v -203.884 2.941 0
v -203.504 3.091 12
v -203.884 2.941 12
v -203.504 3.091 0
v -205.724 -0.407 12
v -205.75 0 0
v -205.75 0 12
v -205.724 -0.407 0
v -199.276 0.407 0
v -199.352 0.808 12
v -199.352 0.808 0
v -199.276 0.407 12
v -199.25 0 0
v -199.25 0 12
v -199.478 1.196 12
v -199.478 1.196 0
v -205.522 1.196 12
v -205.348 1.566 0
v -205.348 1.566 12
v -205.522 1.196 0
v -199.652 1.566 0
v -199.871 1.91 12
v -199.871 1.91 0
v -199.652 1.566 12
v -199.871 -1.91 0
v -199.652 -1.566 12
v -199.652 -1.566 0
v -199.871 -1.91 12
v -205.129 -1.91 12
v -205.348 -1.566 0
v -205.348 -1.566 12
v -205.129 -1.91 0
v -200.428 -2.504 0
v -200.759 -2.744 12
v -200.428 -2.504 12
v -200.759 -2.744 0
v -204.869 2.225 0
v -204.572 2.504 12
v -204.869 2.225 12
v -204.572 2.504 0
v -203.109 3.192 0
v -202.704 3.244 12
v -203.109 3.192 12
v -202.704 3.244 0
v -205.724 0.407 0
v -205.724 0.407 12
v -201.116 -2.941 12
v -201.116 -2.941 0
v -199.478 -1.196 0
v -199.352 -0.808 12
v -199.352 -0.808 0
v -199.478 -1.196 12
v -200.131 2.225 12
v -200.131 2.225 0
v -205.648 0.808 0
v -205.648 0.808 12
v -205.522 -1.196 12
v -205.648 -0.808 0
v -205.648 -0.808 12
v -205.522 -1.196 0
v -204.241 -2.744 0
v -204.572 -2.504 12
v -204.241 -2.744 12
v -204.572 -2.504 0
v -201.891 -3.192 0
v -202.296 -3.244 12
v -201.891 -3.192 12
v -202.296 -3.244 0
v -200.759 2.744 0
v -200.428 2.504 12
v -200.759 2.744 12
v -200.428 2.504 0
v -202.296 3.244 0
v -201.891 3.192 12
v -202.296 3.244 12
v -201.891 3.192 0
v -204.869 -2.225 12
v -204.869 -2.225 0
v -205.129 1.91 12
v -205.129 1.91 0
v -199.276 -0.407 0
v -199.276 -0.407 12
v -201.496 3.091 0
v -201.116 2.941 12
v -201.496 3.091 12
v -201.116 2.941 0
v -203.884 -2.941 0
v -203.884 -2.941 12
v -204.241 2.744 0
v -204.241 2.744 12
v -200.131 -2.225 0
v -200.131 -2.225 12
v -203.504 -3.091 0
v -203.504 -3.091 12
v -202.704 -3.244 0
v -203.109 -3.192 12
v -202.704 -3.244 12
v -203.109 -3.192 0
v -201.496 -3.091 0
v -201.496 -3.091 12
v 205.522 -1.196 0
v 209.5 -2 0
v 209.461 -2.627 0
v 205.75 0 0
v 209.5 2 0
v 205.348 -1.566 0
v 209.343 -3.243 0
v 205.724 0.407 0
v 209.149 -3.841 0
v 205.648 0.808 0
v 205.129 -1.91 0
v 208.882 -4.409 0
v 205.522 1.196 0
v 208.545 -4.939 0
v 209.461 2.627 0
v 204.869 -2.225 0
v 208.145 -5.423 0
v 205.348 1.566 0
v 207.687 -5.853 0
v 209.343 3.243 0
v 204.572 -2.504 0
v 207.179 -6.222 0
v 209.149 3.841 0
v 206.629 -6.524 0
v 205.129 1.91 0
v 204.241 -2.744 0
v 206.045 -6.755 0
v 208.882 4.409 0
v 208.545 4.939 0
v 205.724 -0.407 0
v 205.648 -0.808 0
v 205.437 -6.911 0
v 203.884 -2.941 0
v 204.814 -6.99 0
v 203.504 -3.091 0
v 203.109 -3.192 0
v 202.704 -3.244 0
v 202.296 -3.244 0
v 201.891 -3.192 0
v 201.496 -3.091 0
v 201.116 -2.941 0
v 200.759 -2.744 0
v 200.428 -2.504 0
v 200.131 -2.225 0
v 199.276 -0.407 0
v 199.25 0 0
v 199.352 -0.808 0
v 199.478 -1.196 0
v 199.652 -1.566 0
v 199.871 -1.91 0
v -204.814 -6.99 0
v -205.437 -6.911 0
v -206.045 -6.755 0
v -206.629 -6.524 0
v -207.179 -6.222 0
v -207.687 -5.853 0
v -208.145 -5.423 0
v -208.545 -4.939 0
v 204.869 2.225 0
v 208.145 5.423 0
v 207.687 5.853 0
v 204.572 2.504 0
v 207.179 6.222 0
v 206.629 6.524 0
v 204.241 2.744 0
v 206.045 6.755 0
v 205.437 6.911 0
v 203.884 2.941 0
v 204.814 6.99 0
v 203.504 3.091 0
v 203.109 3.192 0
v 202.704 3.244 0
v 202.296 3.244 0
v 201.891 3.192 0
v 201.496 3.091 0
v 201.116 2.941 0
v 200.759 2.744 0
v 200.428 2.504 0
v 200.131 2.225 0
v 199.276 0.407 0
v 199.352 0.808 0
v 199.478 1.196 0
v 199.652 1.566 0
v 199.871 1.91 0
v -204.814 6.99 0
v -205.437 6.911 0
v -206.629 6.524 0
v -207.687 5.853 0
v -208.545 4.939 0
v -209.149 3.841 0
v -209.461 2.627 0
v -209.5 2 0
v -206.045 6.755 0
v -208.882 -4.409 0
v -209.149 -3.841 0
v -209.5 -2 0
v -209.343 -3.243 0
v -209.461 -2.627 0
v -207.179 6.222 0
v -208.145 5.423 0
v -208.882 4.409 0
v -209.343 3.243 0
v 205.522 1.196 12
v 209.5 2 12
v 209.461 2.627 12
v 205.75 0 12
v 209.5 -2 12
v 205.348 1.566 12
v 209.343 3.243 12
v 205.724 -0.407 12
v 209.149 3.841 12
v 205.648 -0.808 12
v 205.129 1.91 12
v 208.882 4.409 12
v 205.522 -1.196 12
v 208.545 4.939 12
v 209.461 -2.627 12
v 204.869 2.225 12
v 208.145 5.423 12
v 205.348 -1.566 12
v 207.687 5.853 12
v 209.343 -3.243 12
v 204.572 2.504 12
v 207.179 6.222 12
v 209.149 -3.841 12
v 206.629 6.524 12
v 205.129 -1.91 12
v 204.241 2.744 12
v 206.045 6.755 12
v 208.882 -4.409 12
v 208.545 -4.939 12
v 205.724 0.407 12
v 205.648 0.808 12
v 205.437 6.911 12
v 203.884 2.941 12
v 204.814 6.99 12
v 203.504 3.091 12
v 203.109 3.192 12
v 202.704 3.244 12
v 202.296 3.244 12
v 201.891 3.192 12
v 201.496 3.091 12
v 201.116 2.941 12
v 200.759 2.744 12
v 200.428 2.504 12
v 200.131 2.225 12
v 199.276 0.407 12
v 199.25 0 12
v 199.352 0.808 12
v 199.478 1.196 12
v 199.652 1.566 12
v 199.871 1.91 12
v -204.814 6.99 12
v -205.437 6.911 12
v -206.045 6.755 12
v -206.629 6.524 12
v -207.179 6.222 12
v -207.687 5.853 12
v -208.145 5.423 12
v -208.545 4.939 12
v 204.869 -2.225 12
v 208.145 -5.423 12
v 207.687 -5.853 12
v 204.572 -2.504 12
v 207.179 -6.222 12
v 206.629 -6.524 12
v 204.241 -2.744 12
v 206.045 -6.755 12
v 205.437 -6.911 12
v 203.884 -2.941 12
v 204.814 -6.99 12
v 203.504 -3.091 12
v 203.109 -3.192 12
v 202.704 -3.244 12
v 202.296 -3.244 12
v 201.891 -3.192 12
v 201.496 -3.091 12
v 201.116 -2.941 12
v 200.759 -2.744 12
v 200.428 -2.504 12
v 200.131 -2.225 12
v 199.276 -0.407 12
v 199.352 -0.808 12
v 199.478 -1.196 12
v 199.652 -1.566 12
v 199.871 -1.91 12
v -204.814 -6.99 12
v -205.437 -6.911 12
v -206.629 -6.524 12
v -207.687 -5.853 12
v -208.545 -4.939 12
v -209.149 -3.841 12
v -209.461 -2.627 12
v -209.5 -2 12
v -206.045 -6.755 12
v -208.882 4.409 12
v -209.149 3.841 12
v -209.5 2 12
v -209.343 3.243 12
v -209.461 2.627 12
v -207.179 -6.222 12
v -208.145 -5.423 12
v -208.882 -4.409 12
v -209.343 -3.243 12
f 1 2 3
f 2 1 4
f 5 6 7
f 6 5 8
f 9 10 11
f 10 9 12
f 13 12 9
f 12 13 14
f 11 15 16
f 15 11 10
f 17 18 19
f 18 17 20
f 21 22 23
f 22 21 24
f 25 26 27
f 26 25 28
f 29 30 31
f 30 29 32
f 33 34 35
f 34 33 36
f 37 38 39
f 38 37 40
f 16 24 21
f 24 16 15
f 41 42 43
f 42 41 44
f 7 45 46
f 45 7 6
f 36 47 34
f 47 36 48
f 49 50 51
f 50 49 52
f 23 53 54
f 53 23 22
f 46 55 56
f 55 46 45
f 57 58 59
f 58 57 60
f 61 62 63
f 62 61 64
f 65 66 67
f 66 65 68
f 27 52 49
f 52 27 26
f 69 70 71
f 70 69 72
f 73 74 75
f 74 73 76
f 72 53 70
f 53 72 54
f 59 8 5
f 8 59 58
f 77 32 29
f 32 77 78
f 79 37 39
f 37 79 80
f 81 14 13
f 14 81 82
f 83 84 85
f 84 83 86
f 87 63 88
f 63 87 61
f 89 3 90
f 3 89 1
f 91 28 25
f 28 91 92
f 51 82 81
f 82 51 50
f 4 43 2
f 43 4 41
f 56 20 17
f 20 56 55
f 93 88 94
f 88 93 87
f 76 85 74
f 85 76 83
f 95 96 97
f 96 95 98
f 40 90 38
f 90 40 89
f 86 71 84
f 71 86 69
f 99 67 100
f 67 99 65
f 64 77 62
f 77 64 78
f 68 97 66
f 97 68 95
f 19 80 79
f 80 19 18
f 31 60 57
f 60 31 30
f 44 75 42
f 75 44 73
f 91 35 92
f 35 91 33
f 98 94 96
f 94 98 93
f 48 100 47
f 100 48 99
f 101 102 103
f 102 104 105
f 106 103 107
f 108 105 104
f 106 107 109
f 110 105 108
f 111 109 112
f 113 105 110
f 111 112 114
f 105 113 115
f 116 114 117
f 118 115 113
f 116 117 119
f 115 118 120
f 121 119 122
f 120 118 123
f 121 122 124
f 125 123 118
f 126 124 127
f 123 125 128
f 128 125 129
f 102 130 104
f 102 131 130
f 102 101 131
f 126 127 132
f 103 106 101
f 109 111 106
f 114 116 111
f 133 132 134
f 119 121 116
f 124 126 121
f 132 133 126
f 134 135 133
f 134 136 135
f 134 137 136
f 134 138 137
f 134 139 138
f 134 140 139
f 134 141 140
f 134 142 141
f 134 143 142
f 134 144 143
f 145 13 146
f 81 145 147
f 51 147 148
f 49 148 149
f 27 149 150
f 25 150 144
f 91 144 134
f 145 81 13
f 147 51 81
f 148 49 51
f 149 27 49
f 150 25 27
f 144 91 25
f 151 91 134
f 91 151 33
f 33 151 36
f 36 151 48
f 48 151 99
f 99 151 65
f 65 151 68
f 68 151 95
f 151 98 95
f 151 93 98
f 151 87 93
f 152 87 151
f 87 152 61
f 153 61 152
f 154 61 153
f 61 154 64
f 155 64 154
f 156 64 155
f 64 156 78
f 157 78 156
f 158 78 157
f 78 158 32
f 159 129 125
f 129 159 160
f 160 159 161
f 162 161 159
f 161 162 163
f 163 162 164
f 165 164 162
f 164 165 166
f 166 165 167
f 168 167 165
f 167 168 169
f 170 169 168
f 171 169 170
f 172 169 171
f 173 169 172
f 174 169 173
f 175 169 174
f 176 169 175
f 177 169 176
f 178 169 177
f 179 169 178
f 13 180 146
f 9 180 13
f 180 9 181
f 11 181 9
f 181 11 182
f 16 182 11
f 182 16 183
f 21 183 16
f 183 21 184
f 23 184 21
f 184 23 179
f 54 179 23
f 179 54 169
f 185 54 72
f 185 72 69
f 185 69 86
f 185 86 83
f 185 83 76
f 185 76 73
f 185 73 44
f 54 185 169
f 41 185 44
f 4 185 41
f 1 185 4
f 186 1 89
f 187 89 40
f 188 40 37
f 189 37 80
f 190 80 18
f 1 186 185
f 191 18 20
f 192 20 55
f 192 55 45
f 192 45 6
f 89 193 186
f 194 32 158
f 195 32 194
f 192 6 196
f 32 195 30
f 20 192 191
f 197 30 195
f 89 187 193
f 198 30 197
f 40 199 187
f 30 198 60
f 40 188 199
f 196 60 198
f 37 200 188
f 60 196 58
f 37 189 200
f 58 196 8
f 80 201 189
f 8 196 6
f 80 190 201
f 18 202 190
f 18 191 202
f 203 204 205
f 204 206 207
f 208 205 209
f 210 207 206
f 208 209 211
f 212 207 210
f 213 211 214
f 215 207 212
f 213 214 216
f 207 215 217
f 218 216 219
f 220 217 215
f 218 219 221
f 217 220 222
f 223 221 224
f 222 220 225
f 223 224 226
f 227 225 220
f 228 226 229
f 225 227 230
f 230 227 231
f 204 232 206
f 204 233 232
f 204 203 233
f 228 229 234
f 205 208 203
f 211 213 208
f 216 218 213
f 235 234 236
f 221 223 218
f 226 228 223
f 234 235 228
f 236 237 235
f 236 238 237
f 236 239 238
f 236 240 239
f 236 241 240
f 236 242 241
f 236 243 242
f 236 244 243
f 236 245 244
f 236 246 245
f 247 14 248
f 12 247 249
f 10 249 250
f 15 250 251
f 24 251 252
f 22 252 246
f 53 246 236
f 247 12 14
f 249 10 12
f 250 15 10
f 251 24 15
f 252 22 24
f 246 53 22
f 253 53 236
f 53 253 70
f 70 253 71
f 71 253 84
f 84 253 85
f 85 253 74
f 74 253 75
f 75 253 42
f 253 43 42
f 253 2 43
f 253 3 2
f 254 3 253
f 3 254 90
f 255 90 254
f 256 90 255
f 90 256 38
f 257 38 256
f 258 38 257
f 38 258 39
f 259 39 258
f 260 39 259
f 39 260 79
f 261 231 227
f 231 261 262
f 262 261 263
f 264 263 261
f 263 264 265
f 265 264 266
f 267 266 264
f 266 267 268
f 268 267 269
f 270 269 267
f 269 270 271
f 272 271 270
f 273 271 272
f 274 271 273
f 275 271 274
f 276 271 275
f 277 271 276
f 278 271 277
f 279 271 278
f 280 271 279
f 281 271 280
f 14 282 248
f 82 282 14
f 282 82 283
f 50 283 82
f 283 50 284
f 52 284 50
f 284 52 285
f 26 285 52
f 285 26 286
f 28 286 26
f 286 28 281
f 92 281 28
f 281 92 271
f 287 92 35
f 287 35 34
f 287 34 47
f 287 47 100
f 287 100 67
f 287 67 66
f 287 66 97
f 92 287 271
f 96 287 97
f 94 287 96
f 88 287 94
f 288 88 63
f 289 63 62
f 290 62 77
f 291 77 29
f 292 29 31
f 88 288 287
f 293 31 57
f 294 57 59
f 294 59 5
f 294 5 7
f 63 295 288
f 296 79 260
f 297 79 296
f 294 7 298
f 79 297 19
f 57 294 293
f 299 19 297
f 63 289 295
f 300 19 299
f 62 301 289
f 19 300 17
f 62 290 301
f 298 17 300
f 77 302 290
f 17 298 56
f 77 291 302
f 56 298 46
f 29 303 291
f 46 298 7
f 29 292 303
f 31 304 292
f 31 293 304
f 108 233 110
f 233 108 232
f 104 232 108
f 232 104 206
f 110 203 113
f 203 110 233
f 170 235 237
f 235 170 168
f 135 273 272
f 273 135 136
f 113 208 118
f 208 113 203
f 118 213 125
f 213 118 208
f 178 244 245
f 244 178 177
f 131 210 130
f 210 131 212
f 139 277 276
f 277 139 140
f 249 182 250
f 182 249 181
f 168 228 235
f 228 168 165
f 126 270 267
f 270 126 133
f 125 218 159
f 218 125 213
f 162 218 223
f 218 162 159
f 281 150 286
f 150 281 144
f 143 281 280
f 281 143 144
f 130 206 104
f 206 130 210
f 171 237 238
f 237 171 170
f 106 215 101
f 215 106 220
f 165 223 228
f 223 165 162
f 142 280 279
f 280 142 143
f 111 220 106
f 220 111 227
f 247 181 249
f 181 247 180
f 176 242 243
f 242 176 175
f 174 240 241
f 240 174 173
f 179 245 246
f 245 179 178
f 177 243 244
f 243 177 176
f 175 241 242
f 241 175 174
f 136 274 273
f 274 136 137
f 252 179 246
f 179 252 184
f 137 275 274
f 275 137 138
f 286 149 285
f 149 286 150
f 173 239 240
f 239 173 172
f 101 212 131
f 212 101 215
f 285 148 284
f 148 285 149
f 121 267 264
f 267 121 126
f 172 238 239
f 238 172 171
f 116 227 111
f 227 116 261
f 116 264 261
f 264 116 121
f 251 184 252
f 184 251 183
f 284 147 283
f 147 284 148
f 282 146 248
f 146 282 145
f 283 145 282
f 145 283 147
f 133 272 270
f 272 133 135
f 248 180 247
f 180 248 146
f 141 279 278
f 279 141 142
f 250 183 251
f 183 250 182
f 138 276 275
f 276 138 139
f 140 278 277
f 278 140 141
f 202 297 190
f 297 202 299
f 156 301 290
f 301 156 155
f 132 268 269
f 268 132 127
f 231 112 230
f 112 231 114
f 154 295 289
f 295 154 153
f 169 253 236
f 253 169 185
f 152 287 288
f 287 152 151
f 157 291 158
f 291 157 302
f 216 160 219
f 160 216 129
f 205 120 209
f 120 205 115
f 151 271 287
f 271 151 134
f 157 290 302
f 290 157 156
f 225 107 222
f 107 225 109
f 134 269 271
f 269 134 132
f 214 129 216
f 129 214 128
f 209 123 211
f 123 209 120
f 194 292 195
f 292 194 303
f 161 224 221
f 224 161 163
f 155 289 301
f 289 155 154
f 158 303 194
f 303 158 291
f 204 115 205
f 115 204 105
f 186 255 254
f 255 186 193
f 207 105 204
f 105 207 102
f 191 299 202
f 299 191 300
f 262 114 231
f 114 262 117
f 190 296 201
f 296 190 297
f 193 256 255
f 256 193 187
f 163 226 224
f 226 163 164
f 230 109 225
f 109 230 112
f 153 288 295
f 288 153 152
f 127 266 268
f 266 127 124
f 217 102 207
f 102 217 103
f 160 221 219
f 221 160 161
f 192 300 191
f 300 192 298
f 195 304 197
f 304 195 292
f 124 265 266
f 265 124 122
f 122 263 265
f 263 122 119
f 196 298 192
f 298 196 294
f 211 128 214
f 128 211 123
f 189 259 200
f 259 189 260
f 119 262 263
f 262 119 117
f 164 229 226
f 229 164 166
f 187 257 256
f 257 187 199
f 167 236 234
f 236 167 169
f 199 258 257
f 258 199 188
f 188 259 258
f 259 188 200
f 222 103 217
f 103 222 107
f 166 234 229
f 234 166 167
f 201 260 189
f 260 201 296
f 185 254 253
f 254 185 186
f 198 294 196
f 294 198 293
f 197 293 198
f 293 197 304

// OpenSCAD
$fn = 50;


difference() {
	union() {
		hull() {
			translate(v = [-204.5000000000, 2.0000000000, 0]) {
				cylinder(h = 12, r = 5);
			}
			translate(v = [204.5000000000, 2.0000000000, 0]) {
				cylinder(h = 12, r = 5);
			}
			translate(v = [-204.5000000000, -2.0000000000, 0]) {
				cylinder(h = 12, r = 5);
			}
			translate(v = [204.5000000000, -2.0000000000, 0]) {
				cylinder(h = 12, r = 5);
			}
		}
	}
	union() {
		translate(v = [-202.5000000000, 0.0000000000, 0]) {
			cylinder(h = 12, r = 3.2500000000);
		}
		translate(v = [202.5000000000, 0.0000000000, 0]) {
			cylinder(h = 12, r = 3.2500000000);
		}
		translate(v = [-202.5000000000, 0.0000000000, 0]) {
			cylinder(h = 12, r = 1.8000000000);
		}
		translate(v = [202.5000000000, 0.0000000000, 0]) {
			cylinder(h = 12, r = 1.8000000000);
		}
		translate(v = [-202.5000000000, 0.0000000000, 0]) {
			cylinder(h = 12, r = 1.8000000000);
		}
		translate(v = [202.5000000000, 0.0000000000, 0]) {
			cylinder(h = 12, r = 1.8000000000);
		}
		translate(v = [-202.5000000000, 0.0000000000, 0]) {
			cylinder(h = 12, r = 1.8000000000);
		}
		translate(v = [202.5000000000, 0.0000000000, 0]) {
			cylinder(h = 12, r = 1.8000000000);
		}
	}
}
